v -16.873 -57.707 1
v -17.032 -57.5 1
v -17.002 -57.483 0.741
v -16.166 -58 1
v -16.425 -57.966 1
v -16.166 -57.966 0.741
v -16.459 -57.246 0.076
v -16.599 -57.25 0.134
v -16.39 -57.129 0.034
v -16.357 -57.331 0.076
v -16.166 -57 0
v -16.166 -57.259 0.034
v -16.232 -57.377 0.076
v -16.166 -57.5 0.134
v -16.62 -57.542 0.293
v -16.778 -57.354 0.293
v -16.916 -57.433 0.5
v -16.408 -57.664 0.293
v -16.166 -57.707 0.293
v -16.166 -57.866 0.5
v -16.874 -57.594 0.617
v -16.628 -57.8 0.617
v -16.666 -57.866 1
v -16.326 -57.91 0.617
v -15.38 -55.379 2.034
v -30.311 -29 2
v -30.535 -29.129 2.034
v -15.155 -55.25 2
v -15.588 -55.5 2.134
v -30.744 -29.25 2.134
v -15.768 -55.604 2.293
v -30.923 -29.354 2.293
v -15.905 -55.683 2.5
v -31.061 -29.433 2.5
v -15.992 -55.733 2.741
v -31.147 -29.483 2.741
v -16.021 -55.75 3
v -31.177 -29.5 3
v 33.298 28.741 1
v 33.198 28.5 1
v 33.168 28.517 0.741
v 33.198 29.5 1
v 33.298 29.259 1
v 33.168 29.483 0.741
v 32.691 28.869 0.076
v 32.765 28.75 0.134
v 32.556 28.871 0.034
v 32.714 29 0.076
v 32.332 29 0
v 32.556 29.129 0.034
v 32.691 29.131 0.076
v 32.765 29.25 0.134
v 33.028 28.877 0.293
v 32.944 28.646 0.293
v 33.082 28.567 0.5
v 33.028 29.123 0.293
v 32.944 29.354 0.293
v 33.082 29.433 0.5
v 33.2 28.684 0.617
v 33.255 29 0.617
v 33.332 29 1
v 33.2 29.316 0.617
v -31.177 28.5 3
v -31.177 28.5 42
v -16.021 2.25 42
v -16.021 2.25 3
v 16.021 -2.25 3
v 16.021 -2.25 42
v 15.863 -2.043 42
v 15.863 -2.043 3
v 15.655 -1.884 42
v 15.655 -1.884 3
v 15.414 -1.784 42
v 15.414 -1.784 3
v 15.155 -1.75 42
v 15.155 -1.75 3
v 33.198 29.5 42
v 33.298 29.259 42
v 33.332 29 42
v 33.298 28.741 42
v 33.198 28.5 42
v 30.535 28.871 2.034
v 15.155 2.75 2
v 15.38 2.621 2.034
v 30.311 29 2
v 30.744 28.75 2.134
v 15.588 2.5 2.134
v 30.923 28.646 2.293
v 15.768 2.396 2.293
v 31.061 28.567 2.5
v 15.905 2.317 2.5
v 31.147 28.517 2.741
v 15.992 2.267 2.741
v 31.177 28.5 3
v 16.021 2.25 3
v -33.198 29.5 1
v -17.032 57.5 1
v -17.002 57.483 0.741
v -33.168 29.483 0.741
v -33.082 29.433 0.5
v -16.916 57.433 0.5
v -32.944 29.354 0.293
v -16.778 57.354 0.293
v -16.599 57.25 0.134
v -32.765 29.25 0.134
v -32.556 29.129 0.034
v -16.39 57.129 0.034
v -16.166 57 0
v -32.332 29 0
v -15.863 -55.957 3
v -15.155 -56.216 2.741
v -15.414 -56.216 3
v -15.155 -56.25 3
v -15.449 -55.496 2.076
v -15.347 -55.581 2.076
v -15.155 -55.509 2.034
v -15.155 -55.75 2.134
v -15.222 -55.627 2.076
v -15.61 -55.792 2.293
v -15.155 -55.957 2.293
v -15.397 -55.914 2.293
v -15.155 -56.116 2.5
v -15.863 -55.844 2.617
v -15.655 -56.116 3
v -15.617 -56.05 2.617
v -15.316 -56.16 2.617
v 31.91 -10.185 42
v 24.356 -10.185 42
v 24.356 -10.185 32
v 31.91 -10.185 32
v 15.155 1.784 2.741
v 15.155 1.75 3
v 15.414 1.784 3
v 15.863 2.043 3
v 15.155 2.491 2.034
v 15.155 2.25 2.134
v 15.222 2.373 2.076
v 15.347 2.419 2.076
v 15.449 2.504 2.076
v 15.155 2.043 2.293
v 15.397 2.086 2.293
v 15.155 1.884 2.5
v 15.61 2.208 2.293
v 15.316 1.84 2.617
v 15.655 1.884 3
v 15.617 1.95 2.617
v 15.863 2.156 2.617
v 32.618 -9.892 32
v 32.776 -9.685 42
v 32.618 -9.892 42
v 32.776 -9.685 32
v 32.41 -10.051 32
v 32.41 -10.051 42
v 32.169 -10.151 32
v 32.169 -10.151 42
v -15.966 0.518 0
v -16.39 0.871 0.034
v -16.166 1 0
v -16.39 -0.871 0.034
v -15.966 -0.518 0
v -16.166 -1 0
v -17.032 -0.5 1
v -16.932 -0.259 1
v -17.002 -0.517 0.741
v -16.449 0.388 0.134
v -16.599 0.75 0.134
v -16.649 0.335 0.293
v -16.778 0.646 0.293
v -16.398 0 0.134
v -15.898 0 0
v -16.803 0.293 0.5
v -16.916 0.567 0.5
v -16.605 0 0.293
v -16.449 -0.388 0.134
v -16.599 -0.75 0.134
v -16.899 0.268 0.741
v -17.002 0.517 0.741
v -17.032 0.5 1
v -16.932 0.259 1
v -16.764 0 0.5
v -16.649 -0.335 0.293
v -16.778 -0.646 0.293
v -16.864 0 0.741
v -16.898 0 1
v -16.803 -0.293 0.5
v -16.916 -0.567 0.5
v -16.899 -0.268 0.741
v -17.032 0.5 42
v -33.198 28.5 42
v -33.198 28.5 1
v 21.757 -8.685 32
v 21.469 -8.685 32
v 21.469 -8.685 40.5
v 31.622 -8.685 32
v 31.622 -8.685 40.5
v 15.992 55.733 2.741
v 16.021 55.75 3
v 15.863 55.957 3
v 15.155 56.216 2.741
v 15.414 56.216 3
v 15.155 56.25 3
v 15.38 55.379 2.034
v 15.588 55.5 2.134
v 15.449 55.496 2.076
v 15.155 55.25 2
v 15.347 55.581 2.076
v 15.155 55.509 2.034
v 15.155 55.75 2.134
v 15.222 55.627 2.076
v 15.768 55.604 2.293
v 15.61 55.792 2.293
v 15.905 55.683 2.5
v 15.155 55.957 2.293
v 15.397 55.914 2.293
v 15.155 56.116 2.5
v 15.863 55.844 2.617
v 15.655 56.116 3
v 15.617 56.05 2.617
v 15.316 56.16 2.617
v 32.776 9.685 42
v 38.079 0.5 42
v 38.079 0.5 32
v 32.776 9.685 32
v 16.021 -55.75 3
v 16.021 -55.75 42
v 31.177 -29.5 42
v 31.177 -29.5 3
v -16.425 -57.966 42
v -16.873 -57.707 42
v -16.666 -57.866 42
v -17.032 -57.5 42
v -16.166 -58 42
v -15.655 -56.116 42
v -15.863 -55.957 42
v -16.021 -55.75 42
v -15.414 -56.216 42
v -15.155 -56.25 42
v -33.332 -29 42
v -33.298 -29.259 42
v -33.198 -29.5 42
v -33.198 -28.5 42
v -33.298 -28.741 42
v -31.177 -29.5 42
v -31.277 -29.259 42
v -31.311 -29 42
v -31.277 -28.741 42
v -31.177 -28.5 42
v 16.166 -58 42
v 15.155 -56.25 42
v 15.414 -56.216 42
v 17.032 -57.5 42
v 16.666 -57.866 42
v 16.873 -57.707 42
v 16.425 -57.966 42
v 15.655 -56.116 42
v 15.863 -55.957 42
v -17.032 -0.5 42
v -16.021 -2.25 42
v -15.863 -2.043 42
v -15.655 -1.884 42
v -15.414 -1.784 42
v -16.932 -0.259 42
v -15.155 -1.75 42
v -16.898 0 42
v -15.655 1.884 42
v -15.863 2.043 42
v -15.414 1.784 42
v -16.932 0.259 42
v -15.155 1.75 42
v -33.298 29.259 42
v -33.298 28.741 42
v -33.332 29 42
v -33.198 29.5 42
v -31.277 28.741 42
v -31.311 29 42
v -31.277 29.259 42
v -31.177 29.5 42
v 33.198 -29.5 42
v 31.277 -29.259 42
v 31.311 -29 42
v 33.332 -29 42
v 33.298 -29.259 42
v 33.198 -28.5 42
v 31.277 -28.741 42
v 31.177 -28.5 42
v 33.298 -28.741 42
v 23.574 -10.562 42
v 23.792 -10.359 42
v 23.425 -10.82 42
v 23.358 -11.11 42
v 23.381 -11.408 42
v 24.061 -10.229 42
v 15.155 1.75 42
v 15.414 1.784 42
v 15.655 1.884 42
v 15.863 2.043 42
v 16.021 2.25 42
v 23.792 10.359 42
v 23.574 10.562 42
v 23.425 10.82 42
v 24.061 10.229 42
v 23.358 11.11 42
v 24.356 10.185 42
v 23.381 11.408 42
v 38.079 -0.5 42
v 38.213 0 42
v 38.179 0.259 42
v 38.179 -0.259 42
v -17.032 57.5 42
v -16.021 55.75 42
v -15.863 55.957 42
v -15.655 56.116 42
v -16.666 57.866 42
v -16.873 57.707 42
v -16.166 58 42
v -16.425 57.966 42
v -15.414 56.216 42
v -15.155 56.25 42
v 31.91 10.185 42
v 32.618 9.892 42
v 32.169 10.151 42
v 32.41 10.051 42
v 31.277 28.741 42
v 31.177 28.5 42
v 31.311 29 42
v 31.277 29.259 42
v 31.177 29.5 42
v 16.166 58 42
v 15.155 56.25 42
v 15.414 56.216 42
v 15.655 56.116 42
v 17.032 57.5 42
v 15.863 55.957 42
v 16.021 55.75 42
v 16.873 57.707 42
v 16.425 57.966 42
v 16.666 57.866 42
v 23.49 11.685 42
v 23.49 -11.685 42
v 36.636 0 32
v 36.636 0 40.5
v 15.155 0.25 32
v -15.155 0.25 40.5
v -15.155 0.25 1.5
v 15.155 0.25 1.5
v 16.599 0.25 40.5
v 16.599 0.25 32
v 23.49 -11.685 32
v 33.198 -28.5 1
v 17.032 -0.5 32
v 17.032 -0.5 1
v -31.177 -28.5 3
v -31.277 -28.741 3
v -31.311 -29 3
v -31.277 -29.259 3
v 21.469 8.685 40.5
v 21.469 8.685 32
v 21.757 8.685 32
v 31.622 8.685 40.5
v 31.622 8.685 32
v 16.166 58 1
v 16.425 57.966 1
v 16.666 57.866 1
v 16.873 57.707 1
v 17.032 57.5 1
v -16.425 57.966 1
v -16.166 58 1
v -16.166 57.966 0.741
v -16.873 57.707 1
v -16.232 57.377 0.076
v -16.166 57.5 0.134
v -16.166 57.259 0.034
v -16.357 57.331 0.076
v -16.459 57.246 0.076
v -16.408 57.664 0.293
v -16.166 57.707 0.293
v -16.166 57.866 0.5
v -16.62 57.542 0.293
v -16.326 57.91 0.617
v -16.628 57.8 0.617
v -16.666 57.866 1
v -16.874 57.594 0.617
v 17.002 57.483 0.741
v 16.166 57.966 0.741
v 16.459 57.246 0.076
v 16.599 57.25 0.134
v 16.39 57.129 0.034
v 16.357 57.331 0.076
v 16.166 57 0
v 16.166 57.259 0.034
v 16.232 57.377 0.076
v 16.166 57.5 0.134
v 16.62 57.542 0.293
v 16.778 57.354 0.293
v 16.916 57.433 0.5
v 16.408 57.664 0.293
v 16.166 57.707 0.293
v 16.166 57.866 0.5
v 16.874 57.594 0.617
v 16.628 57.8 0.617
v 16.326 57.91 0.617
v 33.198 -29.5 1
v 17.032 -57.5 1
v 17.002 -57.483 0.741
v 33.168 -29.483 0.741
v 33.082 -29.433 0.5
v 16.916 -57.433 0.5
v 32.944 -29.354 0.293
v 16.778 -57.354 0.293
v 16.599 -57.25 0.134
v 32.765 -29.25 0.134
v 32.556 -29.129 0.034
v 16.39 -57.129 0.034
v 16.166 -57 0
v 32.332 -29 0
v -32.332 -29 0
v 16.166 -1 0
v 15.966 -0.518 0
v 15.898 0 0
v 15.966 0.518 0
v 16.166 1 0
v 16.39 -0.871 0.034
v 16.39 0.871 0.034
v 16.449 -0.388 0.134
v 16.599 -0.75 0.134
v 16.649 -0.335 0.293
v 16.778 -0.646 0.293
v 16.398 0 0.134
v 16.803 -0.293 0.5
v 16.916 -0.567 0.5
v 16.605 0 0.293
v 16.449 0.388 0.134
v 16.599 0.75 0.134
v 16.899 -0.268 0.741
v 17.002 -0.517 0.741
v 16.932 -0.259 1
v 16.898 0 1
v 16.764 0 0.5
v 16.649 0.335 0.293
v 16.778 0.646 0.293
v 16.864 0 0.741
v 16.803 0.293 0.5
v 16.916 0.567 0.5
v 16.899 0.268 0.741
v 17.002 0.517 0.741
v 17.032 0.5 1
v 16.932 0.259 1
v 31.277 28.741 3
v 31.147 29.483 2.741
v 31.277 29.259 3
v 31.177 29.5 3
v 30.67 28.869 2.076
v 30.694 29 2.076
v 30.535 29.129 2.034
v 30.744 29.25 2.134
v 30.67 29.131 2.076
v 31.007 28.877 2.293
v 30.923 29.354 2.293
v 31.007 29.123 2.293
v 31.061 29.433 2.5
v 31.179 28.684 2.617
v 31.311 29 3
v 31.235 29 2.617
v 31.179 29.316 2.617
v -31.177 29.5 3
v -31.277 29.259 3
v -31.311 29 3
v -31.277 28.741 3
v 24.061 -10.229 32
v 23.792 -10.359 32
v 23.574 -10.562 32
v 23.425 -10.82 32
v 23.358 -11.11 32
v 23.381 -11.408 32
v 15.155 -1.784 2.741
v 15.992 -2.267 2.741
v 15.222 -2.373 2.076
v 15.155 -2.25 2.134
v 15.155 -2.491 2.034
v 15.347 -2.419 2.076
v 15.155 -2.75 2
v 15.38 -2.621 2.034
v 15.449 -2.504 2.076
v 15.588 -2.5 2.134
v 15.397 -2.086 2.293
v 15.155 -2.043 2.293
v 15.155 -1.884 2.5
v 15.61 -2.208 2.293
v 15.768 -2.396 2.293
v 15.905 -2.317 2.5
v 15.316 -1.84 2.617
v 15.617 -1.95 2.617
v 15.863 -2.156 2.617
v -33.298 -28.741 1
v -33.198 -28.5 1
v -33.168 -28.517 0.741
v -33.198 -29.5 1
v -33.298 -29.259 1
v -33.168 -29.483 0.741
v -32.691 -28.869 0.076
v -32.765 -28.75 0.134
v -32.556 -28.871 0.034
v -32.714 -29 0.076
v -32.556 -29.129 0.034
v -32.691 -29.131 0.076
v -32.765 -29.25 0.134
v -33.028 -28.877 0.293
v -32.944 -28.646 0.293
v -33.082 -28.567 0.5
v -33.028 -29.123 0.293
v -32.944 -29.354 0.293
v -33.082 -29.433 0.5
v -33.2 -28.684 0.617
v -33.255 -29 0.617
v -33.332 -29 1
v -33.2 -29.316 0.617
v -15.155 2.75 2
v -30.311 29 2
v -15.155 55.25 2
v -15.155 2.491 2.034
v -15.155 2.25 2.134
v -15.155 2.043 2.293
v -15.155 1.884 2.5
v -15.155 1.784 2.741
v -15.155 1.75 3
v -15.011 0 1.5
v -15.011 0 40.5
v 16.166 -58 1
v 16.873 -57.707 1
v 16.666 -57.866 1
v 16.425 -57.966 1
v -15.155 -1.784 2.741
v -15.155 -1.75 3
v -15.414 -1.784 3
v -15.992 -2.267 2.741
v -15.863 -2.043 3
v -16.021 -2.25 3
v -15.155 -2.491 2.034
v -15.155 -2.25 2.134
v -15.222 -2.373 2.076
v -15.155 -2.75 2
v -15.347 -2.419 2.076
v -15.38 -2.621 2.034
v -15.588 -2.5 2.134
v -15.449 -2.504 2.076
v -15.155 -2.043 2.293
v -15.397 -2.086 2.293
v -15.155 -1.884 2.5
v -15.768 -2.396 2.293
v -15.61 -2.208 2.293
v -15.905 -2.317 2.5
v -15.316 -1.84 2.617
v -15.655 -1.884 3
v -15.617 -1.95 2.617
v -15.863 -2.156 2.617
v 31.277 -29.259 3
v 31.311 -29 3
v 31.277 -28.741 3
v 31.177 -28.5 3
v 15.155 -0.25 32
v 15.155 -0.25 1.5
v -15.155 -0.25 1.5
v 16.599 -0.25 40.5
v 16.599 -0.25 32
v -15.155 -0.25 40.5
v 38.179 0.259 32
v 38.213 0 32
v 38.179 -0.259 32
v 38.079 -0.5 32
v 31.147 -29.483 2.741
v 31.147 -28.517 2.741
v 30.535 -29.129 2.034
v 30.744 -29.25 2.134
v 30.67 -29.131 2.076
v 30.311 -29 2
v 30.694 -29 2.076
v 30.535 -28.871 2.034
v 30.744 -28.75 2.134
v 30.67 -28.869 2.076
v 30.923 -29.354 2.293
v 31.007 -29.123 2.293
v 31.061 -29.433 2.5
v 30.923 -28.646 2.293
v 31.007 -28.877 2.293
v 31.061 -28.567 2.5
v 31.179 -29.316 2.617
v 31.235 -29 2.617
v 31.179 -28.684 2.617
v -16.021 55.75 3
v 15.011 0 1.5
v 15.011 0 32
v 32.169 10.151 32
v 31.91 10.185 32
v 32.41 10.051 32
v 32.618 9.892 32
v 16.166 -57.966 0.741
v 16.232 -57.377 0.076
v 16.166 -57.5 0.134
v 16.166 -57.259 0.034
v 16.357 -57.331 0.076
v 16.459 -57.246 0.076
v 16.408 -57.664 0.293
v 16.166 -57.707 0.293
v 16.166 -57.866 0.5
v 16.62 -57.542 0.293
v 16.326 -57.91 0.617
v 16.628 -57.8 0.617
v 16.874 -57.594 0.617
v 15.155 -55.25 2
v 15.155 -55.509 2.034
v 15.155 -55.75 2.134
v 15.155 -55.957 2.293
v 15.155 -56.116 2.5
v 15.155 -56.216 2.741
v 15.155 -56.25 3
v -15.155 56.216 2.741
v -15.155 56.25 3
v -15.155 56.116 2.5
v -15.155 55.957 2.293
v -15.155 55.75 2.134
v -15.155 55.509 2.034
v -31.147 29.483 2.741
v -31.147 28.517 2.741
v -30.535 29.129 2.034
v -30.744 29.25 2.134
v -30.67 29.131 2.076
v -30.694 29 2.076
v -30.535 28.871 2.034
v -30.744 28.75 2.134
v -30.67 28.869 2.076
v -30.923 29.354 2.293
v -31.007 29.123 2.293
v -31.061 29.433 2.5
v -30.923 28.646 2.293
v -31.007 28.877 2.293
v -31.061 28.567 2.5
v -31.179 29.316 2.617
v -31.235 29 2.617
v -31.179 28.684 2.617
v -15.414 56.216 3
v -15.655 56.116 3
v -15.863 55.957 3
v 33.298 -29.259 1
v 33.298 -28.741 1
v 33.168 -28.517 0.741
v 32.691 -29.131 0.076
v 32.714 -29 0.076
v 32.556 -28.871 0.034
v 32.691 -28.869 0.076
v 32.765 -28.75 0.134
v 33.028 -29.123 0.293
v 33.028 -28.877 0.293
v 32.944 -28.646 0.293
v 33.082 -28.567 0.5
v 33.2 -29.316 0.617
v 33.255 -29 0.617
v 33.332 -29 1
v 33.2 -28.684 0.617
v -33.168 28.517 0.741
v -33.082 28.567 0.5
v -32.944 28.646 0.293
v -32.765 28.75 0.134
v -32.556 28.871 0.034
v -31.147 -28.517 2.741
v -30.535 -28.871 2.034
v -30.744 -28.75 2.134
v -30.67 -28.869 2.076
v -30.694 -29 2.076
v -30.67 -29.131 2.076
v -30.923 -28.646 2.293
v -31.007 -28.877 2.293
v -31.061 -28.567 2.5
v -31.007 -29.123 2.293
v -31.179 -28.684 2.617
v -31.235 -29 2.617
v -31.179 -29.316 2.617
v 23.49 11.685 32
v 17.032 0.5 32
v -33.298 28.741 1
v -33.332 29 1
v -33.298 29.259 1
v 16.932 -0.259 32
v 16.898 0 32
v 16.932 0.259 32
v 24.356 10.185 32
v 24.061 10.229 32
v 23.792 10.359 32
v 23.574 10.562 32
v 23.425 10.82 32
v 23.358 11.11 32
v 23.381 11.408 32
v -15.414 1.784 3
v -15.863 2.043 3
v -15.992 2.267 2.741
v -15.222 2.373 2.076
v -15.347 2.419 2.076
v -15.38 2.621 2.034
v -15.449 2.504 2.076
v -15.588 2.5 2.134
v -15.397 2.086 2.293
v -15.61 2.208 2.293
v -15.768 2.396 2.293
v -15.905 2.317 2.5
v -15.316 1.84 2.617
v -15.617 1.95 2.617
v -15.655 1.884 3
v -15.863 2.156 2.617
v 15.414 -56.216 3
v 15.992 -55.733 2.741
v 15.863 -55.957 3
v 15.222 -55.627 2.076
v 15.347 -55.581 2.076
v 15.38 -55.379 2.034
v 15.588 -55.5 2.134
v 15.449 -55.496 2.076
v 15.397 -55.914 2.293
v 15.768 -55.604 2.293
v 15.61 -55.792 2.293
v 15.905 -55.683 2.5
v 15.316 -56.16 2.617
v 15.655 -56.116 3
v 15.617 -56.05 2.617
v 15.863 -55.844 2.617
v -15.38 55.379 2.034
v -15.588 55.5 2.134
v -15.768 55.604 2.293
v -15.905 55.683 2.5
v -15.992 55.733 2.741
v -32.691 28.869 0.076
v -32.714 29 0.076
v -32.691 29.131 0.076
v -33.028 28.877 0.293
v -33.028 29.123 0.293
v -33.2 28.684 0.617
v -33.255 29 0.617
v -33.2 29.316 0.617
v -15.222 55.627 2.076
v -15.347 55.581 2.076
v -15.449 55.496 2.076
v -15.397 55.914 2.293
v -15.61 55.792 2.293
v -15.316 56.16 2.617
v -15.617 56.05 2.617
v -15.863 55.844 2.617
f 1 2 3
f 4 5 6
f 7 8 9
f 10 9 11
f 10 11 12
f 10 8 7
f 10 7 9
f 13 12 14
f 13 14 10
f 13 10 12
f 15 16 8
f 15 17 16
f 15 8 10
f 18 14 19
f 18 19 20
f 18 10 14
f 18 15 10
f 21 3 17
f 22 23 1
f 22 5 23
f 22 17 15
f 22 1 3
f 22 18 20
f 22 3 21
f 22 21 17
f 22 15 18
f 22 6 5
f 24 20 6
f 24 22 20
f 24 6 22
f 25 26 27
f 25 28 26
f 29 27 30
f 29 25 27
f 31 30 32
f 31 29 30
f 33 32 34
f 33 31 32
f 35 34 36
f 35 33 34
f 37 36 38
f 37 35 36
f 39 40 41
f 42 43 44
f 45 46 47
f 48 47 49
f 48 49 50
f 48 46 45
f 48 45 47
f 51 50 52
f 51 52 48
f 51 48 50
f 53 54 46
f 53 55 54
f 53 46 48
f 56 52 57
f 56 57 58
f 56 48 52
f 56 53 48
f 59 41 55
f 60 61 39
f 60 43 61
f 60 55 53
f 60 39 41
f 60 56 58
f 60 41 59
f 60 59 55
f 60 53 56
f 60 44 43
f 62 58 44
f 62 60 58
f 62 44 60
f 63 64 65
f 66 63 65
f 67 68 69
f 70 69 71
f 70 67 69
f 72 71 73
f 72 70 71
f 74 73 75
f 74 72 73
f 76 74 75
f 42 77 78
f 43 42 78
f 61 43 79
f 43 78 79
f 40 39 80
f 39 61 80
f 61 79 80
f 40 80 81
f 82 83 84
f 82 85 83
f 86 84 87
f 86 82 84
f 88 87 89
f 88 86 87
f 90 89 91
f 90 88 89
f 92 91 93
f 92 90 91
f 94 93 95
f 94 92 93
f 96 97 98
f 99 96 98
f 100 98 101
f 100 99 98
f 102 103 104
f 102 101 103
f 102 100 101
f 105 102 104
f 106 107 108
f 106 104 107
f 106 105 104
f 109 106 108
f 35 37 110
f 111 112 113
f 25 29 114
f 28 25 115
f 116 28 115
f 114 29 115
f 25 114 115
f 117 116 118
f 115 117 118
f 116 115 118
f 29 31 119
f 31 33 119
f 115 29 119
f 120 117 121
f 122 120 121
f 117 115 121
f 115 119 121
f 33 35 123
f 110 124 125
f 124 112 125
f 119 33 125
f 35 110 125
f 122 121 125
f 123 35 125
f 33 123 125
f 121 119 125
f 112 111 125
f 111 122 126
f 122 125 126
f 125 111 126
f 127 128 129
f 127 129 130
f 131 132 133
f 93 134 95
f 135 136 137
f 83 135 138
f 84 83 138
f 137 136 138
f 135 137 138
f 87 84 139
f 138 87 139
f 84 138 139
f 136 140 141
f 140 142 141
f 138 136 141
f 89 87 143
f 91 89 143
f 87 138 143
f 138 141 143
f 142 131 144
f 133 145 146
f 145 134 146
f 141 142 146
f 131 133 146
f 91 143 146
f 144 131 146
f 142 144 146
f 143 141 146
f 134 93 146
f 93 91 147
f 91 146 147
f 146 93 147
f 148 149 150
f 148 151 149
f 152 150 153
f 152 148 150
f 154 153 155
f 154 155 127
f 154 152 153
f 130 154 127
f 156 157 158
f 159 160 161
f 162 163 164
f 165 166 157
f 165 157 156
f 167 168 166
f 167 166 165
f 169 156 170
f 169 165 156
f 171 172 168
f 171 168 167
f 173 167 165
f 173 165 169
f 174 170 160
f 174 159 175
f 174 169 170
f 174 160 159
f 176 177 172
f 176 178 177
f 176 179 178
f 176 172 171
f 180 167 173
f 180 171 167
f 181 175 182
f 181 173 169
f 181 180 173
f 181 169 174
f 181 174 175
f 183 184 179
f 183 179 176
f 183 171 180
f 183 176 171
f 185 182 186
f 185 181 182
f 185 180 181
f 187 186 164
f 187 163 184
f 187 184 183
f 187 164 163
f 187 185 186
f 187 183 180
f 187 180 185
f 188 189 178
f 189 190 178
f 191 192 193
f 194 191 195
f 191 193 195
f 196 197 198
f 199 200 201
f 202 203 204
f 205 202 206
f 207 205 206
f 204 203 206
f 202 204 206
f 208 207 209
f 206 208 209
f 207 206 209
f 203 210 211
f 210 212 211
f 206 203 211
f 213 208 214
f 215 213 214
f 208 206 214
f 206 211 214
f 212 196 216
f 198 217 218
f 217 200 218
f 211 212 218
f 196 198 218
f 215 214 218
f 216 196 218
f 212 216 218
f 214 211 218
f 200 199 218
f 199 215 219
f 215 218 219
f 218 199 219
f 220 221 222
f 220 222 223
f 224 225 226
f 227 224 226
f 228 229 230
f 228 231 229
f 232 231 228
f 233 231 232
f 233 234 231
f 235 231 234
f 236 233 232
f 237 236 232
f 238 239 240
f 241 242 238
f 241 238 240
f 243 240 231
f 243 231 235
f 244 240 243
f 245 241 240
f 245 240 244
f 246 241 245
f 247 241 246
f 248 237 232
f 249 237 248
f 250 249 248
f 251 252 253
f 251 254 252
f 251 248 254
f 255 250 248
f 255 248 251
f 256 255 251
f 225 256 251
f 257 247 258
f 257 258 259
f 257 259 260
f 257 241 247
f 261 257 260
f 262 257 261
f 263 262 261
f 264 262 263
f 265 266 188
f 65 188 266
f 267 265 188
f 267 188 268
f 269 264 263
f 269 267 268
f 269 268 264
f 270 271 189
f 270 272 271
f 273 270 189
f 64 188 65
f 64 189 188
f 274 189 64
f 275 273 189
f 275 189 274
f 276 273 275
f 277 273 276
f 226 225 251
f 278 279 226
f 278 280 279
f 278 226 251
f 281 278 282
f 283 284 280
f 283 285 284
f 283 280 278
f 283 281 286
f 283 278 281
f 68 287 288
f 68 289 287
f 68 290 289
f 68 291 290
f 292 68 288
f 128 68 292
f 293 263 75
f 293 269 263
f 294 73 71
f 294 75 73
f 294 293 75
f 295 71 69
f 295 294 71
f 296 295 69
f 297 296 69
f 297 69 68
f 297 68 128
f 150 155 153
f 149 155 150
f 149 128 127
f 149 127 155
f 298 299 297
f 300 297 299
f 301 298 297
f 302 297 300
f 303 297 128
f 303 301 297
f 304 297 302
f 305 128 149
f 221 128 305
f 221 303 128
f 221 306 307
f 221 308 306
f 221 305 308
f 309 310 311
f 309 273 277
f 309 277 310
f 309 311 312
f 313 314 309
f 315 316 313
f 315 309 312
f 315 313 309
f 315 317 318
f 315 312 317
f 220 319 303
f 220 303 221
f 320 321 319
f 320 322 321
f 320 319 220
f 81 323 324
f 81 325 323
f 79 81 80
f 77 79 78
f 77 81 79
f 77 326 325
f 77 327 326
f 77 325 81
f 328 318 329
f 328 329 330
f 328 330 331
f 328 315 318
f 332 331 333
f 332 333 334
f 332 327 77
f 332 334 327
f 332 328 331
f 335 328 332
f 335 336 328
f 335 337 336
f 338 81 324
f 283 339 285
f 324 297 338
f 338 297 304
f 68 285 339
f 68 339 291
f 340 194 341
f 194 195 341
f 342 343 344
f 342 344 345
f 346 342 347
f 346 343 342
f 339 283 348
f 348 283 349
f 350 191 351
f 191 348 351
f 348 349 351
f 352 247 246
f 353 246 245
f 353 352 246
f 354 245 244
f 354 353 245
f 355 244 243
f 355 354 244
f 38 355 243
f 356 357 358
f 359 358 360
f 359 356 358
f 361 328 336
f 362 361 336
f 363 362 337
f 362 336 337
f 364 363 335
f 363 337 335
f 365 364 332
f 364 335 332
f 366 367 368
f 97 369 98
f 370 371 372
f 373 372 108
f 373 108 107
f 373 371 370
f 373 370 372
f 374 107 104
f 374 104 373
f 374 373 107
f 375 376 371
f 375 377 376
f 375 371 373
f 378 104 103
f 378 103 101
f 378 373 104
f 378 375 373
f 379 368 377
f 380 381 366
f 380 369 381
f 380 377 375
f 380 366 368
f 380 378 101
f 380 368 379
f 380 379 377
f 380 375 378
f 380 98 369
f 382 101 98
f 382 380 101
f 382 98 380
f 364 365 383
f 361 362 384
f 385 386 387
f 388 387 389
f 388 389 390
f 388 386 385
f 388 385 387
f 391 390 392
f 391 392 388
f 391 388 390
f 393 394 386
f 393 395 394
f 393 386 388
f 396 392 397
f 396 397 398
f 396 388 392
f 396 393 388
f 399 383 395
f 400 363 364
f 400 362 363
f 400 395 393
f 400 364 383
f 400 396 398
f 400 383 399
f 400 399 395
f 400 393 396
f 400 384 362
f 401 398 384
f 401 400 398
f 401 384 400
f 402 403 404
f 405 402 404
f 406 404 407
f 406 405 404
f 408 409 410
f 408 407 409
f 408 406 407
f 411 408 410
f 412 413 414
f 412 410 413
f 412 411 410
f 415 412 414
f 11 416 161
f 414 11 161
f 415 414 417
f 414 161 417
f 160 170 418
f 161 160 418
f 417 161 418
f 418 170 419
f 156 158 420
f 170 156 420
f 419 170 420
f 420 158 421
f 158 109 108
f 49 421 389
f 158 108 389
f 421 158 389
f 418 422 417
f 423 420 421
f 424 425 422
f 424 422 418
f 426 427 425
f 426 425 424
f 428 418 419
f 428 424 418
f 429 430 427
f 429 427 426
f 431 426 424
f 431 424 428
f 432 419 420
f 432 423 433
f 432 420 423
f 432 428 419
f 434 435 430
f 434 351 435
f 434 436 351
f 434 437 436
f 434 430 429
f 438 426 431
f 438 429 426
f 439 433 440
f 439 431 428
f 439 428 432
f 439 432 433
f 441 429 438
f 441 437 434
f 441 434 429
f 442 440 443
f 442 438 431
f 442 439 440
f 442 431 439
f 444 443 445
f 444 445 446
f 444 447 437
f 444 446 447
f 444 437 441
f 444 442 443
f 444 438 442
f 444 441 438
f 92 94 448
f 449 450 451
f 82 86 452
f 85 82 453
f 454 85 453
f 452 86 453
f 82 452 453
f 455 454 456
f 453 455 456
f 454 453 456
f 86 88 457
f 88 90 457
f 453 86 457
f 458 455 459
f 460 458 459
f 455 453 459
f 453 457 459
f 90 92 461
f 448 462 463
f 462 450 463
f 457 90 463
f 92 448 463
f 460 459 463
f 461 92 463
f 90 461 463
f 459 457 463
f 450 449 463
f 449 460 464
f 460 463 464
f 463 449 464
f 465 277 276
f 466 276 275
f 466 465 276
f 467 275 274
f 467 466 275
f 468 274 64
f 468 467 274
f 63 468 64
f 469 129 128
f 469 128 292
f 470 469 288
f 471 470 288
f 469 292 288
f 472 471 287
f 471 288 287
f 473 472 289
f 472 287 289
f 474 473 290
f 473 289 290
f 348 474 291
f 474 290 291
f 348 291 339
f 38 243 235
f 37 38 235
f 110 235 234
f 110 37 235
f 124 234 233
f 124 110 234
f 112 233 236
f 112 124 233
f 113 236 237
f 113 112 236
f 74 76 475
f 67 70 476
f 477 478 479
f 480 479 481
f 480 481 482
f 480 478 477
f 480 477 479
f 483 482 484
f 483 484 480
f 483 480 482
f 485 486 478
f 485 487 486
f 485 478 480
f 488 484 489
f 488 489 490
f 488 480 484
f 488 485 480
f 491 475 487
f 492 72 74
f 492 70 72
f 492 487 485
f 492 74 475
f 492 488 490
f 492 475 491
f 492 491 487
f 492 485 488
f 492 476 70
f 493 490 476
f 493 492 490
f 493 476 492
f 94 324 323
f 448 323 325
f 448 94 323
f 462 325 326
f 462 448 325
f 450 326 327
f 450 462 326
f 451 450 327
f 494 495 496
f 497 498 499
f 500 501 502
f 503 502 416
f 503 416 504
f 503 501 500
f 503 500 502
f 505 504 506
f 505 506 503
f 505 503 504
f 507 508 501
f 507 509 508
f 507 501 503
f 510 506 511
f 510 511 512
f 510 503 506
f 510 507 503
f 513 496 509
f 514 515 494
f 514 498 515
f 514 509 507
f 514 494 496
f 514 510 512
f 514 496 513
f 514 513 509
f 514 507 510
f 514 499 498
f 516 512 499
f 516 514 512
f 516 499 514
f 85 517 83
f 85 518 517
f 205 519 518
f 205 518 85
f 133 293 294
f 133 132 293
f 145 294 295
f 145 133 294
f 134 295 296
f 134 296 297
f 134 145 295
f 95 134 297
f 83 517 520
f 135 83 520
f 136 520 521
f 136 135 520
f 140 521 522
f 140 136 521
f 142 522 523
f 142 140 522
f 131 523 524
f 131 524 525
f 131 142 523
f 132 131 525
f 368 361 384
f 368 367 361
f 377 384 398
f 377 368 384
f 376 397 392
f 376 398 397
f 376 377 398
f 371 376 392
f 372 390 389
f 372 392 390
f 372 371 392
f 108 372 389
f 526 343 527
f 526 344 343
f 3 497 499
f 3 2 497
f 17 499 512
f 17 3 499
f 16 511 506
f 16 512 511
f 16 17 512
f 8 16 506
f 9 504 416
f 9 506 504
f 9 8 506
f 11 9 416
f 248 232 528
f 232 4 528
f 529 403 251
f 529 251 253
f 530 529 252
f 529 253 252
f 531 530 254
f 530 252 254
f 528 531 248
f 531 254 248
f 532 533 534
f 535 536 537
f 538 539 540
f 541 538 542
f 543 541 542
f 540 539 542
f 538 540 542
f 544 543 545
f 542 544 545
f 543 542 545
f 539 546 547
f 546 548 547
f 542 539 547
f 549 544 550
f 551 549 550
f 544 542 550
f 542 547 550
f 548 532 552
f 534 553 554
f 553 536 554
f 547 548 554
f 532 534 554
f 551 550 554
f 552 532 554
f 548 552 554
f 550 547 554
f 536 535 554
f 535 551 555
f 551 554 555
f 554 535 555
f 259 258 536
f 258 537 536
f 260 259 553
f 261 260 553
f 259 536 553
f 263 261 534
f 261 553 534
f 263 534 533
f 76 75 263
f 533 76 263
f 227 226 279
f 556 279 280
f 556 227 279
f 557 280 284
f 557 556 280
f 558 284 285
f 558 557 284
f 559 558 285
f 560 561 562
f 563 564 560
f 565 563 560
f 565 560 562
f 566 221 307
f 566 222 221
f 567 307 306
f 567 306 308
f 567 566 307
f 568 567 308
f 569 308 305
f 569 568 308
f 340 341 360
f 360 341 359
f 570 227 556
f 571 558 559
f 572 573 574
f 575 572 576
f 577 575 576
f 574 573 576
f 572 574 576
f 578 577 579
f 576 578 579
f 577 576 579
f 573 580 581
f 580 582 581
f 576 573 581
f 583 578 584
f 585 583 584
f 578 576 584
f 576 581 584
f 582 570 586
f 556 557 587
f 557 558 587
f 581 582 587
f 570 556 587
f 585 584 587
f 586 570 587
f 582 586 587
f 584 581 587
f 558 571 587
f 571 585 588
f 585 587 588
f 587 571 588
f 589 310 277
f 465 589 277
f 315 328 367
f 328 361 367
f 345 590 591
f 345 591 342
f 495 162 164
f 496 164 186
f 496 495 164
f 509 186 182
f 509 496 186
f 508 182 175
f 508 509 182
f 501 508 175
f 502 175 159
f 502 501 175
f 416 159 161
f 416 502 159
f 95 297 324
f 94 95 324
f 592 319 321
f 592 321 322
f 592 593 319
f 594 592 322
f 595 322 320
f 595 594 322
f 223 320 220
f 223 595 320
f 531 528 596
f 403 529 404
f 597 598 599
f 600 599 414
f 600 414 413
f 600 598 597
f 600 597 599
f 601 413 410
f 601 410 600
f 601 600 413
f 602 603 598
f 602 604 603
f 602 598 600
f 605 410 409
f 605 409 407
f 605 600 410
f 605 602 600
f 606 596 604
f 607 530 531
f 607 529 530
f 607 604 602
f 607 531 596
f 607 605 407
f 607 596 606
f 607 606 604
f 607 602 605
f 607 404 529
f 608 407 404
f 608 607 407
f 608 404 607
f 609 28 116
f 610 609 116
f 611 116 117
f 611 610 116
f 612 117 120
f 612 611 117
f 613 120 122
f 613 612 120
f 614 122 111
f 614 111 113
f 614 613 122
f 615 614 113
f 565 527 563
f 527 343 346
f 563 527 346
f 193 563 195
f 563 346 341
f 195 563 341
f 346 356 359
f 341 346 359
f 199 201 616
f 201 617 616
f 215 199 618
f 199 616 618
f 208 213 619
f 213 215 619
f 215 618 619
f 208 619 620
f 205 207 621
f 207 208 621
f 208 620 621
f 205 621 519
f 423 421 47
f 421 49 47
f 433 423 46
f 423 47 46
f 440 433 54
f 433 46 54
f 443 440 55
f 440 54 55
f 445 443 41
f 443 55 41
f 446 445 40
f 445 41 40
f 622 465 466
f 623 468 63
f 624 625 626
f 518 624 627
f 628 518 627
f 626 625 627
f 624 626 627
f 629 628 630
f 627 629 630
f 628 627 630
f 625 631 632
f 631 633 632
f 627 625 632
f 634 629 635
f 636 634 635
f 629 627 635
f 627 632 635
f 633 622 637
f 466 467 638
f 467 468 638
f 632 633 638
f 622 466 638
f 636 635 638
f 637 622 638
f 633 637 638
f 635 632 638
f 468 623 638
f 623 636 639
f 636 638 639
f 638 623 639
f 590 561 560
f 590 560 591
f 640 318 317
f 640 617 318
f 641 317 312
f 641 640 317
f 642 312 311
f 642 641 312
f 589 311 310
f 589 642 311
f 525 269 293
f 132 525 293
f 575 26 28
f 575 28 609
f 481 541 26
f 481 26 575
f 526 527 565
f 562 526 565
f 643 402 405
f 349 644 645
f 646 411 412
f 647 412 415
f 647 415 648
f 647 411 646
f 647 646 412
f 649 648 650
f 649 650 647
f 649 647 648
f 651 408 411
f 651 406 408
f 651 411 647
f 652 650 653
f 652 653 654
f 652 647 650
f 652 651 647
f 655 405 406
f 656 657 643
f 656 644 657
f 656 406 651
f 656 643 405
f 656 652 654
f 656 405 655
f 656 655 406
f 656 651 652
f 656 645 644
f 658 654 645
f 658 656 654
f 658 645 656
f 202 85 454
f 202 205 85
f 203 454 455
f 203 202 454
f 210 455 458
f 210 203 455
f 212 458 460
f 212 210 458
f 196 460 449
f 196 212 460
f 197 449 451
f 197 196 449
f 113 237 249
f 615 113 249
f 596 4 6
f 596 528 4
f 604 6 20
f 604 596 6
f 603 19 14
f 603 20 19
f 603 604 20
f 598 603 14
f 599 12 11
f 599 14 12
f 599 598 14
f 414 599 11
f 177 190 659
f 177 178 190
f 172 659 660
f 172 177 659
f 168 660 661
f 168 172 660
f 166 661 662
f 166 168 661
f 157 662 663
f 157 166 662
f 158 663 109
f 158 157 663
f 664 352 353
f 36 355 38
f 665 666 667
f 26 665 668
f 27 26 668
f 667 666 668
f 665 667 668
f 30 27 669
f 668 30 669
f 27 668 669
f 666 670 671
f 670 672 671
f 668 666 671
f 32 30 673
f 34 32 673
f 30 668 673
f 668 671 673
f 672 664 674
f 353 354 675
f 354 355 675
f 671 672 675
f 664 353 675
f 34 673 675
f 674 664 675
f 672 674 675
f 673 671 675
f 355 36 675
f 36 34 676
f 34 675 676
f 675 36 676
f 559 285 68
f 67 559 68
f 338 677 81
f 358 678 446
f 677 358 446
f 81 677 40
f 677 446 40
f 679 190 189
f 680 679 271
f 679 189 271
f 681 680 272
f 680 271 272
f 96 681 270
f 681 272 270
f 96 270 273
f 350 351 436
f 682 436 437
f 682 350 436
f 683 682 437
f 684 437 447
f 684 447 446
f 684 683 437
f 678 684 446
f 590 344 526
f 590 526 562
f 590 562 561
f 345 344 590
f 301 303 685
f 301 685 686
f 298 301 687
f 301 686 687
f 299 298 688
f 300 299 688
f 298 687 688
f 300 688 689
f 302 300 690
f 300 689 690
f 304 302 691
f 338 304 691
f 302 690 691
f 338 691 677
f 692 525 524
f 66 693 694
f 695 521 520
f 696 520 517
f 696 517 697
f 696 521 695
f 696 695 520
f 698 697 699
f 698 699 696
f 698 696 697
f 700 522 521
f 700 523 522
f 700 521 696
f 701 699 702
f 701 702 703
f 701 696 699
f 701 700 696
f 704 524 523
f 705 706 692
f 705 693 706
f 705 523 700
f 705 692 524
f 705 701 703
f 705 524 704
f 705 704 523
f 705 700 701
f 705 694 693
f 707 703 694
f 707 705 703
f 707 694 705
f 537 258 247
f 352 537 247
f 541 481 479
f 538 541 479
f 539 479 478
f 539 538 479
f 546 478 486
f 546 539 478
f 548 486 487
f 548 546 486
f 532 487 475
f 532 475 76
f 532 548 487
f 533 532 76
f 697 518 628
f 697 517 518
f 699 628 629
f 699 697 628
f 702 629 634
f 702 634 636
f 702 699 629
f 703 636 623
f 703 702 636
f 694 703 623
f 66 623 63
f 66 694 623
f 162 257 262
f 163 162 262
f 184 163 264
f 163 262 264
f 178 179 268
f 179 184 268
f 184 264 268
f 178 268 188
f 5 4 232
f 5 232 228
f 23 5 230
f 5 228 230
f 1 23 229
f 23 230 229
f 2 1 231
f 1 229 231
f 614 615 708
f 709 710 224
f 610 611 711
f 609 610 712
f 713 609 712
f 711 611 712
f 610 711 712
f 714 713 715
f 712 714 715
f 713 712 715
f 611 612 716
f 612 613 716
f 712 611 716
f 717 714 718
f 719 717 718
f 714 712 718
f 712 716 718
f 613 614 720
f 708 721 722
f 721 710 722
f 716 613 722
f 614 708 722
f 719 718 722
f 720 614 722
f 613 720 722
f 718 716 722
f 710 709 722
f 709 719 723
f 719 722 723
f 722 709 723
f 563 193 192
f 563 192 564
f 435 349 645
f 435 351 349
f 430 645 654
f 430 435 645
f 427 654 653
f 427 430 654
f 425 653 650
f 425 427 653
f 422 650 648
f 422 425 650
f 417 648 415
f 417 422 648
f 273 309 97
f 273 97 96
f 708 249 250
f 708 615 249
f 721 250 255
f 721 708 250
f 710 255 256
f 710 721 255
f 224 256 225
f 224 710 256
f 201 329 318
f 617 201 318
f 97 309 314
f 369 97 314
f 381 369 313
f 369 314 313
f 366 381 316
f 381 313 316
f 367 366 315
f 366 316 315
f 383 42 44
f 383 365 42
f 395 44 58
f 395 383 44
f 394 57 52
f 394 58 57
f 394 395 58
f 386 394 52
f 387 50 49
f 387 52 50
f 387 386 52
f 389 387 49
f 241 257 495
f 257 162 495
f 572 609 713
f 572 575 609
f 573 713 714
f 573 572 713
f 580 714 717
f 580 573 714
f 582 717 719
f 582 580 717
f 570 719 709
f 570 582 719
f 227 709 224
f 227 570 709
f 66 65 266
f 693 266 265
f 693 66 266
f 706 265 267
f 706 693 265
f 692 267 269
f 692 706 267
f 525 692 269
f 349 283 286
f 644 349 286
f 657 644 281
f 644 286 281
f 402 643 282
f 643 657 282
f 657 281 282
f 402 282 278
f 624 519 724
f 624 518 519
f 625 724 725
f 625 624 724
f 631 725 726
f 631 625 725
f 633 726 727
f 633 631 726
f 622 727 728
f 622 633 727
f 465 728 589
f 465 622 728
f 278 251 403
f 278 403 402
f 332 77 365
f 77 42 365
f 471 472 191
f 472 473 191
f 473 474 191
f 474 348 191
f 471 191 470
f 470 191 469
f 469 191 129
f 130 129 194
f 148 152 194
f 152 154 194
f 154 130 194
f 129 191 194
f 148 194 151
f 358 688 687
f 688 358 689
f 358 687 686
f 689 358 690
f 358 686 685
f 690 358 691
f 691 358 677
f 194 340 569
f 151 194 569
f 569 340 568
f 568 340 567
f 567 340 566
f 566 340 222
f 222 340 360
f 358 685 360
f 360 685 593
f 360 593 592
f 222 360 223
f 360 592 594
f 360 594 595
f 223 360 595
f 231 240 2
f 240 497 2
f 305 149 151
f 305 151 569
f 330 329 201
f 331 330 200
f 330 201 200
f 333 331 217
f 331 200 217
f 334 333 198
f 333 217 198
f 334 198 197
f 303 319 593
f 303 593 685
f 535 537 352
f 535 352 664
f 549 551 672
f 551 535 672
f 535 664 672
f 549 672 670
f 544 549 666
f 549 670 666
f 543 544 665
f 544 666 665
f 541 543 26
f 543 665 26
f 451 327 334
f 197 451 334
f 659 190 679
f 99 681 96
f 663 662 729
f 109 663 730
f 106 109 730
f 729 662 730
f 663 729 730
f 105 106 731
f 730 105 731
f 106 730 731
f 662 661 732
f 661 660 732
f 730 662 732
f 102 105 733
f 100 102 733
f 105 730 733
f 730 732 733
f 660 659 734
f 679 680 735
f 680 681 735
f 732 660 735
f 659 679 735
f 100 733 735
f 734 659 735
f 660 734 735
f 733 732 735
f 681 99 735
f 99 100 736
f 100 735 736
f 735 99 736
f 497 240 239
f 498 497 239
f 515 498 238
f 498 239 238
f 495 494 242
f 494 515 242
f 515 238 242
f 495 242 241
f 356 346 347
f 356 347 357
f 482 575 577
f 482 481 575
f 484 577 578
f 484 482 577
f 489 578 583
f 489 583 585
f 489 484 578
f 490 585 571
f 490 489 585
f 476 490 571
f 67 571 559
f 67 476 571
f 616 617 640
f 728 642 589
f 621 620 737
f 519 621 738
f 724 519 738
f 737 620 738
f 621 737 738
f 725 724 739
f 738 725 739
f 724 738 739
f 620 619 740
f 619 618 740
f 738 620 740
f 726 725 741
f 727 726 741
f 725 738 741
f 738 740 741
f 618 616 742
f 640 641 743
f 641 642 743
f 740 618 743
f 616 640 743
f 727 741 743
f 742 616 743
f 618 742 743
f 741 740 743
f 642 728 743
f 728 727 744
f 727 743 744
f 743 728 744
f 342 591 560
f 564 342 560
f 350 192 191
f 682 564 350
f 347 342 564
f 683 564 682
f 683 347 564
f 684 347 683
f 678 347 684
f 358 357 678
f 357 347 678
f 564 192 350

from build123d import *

# Parameters (mm, degrees)
F1_DEPTH = 42
F3_DEPTH = 40
F5_DEPTH = 10
F6_T     = -1.5
F7_R     = 1


# Not quite as in the source:
# - a shell that OpenCascade refuses in one call is made with other operations: the cavity is built on its own and cut out


with BuildPart() as f1:
    # F0 (on Top) → F1 (new body)
    with BuildSketch(Plane.XY):
        Polygon((-33.486315613, 29), (-16.7431578065, 0), (-33.486315613, -29), (-16.7431578065, -58), (16.7431578065, -58), (33.486315613, -29), (16.7431578065, 0), (33.486315613, 29), (16.7431578065, 58), (-16.7431578065, 58), align=None)
    extrude(amount=F1_DEPTH)

    # F2 (on face) → F3 (cut)
    with BuildSketch(Plane.XY.offset(42)):
        Polygon((15.7327948354, -1.75), (0, -1.75), (-15.7327948354, -1.75), (-31.4655896708, -29), (-15.7327948354, -56.25), (15.7327948354, -56.25), (31.4655896708, -29), align=None)
        Polygon((-15.7327948354, 1.75), (0, 1.75), (15.7327948354, 1.75), (31.4655896708, 29), (15.7327948354, 56.25), (-15.7327948354, 56.25), (-31.4655896708, 29), align=None)
    extrude(amount=-F3_DEPTH, mode=Mode.SUBTRACT)

    # F4 (on face) → F5 (join)
    with BuildSketch(Plane.XY.offset(42)):
        Polygon((32.4877562844, 10.1850116625), (20.7271178342, 10.1850116625), (14.8467986091, 0), (20.7271178342, -10.1850116625), (32.4877562844, -10.1850116625), (38.3680755094, 0), align=None)
    extrude(amount=-F5_DEPTH)

    # F6: a shell. OpenCascade refuses it in one call, so the cavity is built on its own and cut out:
    # the body offset inwards by the wall thickness, plus a prism from it out through each open face.
    f6_core = offset(f1.part, amount=F6_T, kind=Kind.INTERSECTION, mode=Mode.PRIVATE)
    f6_exits = [f6_core.faces().sort_by_distance(p)[0] for p in [
        (26.515913, 0, 33.5),
    ]]
    add(f6_core, mode=Mode.SUBTRACT)
    extrude(f6_exits, amount=-F6_T, mode=Mode.SUBTRACT)

    # F7
    f7_edges = [f1.edges().sort_by_distance(p)[0] for p in [
        (-33.486316, -29, 21),
        (-16.743158, 0, 21),
        (-33.486316, 29, 21),
        (-16.743158, 58, 21),
        (-16.743158, -58, 21),
        (16.743158, -58, 21),
        (33.486316, -29, 21),
        (16.743158, 0, 16),
        (33.486316, 29, 21),
        (16.743158, 58, 21),
        (-31.46559, 29, 22),
        (-15.732795, 56.25, 22),
        (15.732795, 56.25, 22),
        (31.46559, 29, 22),
        (15.732795, 1.75, 22),
        (-15.732795, 1.75, 22),
        (-31.46559, -29, 22),
        (-15.732795, -1.75, 22),
        (15.732795, -1.75, 22),
        (31.46559, -29, 22),
        (15.732795, -56.25, 22),
        (-15.732795, -56.25, 22),
        (0, 1.75, 2),
        (23.599192, 15.375, 2),
        (23.599192, 42.625, 2),
        (0, 56.25, 2),
        (-23.599192, 42.625, 2),
        (-23.599192, 15.375, 2),
        (0, -1.75, 2),
        (-23.599192, -15.375, 2),
        (-23.599192, -42.625, 2),
        (0, -56.25, 2),
        (23.599192, -42.625, 2),
        (23.599192, -15.375, 2),
        (-25.114737, 14.5, 0),
        (-25.114737, -14.5, 0),
        (-25.114737, -43.5, 0),
        (0, -58, 0),
        (25.114737, -43.5, 0),
        (25.114737, -14.5, 0),
        (25.114737, 14.5, 0),
        (25.114737, 43.5, 0),
        (0, 58, 0),
        (-25.114737, 43.5, 0),
        (22.623477, 10.185012, 37),
        (32.487756, 10.185012, 37),
        (38.368076, 0, 37),
        (32.487756, -10.185012, 37),
        (22.623477, -10.185012, 37),
    ]]
    fillet(f7_edges, radius=F7_R)


solid = f1.part
